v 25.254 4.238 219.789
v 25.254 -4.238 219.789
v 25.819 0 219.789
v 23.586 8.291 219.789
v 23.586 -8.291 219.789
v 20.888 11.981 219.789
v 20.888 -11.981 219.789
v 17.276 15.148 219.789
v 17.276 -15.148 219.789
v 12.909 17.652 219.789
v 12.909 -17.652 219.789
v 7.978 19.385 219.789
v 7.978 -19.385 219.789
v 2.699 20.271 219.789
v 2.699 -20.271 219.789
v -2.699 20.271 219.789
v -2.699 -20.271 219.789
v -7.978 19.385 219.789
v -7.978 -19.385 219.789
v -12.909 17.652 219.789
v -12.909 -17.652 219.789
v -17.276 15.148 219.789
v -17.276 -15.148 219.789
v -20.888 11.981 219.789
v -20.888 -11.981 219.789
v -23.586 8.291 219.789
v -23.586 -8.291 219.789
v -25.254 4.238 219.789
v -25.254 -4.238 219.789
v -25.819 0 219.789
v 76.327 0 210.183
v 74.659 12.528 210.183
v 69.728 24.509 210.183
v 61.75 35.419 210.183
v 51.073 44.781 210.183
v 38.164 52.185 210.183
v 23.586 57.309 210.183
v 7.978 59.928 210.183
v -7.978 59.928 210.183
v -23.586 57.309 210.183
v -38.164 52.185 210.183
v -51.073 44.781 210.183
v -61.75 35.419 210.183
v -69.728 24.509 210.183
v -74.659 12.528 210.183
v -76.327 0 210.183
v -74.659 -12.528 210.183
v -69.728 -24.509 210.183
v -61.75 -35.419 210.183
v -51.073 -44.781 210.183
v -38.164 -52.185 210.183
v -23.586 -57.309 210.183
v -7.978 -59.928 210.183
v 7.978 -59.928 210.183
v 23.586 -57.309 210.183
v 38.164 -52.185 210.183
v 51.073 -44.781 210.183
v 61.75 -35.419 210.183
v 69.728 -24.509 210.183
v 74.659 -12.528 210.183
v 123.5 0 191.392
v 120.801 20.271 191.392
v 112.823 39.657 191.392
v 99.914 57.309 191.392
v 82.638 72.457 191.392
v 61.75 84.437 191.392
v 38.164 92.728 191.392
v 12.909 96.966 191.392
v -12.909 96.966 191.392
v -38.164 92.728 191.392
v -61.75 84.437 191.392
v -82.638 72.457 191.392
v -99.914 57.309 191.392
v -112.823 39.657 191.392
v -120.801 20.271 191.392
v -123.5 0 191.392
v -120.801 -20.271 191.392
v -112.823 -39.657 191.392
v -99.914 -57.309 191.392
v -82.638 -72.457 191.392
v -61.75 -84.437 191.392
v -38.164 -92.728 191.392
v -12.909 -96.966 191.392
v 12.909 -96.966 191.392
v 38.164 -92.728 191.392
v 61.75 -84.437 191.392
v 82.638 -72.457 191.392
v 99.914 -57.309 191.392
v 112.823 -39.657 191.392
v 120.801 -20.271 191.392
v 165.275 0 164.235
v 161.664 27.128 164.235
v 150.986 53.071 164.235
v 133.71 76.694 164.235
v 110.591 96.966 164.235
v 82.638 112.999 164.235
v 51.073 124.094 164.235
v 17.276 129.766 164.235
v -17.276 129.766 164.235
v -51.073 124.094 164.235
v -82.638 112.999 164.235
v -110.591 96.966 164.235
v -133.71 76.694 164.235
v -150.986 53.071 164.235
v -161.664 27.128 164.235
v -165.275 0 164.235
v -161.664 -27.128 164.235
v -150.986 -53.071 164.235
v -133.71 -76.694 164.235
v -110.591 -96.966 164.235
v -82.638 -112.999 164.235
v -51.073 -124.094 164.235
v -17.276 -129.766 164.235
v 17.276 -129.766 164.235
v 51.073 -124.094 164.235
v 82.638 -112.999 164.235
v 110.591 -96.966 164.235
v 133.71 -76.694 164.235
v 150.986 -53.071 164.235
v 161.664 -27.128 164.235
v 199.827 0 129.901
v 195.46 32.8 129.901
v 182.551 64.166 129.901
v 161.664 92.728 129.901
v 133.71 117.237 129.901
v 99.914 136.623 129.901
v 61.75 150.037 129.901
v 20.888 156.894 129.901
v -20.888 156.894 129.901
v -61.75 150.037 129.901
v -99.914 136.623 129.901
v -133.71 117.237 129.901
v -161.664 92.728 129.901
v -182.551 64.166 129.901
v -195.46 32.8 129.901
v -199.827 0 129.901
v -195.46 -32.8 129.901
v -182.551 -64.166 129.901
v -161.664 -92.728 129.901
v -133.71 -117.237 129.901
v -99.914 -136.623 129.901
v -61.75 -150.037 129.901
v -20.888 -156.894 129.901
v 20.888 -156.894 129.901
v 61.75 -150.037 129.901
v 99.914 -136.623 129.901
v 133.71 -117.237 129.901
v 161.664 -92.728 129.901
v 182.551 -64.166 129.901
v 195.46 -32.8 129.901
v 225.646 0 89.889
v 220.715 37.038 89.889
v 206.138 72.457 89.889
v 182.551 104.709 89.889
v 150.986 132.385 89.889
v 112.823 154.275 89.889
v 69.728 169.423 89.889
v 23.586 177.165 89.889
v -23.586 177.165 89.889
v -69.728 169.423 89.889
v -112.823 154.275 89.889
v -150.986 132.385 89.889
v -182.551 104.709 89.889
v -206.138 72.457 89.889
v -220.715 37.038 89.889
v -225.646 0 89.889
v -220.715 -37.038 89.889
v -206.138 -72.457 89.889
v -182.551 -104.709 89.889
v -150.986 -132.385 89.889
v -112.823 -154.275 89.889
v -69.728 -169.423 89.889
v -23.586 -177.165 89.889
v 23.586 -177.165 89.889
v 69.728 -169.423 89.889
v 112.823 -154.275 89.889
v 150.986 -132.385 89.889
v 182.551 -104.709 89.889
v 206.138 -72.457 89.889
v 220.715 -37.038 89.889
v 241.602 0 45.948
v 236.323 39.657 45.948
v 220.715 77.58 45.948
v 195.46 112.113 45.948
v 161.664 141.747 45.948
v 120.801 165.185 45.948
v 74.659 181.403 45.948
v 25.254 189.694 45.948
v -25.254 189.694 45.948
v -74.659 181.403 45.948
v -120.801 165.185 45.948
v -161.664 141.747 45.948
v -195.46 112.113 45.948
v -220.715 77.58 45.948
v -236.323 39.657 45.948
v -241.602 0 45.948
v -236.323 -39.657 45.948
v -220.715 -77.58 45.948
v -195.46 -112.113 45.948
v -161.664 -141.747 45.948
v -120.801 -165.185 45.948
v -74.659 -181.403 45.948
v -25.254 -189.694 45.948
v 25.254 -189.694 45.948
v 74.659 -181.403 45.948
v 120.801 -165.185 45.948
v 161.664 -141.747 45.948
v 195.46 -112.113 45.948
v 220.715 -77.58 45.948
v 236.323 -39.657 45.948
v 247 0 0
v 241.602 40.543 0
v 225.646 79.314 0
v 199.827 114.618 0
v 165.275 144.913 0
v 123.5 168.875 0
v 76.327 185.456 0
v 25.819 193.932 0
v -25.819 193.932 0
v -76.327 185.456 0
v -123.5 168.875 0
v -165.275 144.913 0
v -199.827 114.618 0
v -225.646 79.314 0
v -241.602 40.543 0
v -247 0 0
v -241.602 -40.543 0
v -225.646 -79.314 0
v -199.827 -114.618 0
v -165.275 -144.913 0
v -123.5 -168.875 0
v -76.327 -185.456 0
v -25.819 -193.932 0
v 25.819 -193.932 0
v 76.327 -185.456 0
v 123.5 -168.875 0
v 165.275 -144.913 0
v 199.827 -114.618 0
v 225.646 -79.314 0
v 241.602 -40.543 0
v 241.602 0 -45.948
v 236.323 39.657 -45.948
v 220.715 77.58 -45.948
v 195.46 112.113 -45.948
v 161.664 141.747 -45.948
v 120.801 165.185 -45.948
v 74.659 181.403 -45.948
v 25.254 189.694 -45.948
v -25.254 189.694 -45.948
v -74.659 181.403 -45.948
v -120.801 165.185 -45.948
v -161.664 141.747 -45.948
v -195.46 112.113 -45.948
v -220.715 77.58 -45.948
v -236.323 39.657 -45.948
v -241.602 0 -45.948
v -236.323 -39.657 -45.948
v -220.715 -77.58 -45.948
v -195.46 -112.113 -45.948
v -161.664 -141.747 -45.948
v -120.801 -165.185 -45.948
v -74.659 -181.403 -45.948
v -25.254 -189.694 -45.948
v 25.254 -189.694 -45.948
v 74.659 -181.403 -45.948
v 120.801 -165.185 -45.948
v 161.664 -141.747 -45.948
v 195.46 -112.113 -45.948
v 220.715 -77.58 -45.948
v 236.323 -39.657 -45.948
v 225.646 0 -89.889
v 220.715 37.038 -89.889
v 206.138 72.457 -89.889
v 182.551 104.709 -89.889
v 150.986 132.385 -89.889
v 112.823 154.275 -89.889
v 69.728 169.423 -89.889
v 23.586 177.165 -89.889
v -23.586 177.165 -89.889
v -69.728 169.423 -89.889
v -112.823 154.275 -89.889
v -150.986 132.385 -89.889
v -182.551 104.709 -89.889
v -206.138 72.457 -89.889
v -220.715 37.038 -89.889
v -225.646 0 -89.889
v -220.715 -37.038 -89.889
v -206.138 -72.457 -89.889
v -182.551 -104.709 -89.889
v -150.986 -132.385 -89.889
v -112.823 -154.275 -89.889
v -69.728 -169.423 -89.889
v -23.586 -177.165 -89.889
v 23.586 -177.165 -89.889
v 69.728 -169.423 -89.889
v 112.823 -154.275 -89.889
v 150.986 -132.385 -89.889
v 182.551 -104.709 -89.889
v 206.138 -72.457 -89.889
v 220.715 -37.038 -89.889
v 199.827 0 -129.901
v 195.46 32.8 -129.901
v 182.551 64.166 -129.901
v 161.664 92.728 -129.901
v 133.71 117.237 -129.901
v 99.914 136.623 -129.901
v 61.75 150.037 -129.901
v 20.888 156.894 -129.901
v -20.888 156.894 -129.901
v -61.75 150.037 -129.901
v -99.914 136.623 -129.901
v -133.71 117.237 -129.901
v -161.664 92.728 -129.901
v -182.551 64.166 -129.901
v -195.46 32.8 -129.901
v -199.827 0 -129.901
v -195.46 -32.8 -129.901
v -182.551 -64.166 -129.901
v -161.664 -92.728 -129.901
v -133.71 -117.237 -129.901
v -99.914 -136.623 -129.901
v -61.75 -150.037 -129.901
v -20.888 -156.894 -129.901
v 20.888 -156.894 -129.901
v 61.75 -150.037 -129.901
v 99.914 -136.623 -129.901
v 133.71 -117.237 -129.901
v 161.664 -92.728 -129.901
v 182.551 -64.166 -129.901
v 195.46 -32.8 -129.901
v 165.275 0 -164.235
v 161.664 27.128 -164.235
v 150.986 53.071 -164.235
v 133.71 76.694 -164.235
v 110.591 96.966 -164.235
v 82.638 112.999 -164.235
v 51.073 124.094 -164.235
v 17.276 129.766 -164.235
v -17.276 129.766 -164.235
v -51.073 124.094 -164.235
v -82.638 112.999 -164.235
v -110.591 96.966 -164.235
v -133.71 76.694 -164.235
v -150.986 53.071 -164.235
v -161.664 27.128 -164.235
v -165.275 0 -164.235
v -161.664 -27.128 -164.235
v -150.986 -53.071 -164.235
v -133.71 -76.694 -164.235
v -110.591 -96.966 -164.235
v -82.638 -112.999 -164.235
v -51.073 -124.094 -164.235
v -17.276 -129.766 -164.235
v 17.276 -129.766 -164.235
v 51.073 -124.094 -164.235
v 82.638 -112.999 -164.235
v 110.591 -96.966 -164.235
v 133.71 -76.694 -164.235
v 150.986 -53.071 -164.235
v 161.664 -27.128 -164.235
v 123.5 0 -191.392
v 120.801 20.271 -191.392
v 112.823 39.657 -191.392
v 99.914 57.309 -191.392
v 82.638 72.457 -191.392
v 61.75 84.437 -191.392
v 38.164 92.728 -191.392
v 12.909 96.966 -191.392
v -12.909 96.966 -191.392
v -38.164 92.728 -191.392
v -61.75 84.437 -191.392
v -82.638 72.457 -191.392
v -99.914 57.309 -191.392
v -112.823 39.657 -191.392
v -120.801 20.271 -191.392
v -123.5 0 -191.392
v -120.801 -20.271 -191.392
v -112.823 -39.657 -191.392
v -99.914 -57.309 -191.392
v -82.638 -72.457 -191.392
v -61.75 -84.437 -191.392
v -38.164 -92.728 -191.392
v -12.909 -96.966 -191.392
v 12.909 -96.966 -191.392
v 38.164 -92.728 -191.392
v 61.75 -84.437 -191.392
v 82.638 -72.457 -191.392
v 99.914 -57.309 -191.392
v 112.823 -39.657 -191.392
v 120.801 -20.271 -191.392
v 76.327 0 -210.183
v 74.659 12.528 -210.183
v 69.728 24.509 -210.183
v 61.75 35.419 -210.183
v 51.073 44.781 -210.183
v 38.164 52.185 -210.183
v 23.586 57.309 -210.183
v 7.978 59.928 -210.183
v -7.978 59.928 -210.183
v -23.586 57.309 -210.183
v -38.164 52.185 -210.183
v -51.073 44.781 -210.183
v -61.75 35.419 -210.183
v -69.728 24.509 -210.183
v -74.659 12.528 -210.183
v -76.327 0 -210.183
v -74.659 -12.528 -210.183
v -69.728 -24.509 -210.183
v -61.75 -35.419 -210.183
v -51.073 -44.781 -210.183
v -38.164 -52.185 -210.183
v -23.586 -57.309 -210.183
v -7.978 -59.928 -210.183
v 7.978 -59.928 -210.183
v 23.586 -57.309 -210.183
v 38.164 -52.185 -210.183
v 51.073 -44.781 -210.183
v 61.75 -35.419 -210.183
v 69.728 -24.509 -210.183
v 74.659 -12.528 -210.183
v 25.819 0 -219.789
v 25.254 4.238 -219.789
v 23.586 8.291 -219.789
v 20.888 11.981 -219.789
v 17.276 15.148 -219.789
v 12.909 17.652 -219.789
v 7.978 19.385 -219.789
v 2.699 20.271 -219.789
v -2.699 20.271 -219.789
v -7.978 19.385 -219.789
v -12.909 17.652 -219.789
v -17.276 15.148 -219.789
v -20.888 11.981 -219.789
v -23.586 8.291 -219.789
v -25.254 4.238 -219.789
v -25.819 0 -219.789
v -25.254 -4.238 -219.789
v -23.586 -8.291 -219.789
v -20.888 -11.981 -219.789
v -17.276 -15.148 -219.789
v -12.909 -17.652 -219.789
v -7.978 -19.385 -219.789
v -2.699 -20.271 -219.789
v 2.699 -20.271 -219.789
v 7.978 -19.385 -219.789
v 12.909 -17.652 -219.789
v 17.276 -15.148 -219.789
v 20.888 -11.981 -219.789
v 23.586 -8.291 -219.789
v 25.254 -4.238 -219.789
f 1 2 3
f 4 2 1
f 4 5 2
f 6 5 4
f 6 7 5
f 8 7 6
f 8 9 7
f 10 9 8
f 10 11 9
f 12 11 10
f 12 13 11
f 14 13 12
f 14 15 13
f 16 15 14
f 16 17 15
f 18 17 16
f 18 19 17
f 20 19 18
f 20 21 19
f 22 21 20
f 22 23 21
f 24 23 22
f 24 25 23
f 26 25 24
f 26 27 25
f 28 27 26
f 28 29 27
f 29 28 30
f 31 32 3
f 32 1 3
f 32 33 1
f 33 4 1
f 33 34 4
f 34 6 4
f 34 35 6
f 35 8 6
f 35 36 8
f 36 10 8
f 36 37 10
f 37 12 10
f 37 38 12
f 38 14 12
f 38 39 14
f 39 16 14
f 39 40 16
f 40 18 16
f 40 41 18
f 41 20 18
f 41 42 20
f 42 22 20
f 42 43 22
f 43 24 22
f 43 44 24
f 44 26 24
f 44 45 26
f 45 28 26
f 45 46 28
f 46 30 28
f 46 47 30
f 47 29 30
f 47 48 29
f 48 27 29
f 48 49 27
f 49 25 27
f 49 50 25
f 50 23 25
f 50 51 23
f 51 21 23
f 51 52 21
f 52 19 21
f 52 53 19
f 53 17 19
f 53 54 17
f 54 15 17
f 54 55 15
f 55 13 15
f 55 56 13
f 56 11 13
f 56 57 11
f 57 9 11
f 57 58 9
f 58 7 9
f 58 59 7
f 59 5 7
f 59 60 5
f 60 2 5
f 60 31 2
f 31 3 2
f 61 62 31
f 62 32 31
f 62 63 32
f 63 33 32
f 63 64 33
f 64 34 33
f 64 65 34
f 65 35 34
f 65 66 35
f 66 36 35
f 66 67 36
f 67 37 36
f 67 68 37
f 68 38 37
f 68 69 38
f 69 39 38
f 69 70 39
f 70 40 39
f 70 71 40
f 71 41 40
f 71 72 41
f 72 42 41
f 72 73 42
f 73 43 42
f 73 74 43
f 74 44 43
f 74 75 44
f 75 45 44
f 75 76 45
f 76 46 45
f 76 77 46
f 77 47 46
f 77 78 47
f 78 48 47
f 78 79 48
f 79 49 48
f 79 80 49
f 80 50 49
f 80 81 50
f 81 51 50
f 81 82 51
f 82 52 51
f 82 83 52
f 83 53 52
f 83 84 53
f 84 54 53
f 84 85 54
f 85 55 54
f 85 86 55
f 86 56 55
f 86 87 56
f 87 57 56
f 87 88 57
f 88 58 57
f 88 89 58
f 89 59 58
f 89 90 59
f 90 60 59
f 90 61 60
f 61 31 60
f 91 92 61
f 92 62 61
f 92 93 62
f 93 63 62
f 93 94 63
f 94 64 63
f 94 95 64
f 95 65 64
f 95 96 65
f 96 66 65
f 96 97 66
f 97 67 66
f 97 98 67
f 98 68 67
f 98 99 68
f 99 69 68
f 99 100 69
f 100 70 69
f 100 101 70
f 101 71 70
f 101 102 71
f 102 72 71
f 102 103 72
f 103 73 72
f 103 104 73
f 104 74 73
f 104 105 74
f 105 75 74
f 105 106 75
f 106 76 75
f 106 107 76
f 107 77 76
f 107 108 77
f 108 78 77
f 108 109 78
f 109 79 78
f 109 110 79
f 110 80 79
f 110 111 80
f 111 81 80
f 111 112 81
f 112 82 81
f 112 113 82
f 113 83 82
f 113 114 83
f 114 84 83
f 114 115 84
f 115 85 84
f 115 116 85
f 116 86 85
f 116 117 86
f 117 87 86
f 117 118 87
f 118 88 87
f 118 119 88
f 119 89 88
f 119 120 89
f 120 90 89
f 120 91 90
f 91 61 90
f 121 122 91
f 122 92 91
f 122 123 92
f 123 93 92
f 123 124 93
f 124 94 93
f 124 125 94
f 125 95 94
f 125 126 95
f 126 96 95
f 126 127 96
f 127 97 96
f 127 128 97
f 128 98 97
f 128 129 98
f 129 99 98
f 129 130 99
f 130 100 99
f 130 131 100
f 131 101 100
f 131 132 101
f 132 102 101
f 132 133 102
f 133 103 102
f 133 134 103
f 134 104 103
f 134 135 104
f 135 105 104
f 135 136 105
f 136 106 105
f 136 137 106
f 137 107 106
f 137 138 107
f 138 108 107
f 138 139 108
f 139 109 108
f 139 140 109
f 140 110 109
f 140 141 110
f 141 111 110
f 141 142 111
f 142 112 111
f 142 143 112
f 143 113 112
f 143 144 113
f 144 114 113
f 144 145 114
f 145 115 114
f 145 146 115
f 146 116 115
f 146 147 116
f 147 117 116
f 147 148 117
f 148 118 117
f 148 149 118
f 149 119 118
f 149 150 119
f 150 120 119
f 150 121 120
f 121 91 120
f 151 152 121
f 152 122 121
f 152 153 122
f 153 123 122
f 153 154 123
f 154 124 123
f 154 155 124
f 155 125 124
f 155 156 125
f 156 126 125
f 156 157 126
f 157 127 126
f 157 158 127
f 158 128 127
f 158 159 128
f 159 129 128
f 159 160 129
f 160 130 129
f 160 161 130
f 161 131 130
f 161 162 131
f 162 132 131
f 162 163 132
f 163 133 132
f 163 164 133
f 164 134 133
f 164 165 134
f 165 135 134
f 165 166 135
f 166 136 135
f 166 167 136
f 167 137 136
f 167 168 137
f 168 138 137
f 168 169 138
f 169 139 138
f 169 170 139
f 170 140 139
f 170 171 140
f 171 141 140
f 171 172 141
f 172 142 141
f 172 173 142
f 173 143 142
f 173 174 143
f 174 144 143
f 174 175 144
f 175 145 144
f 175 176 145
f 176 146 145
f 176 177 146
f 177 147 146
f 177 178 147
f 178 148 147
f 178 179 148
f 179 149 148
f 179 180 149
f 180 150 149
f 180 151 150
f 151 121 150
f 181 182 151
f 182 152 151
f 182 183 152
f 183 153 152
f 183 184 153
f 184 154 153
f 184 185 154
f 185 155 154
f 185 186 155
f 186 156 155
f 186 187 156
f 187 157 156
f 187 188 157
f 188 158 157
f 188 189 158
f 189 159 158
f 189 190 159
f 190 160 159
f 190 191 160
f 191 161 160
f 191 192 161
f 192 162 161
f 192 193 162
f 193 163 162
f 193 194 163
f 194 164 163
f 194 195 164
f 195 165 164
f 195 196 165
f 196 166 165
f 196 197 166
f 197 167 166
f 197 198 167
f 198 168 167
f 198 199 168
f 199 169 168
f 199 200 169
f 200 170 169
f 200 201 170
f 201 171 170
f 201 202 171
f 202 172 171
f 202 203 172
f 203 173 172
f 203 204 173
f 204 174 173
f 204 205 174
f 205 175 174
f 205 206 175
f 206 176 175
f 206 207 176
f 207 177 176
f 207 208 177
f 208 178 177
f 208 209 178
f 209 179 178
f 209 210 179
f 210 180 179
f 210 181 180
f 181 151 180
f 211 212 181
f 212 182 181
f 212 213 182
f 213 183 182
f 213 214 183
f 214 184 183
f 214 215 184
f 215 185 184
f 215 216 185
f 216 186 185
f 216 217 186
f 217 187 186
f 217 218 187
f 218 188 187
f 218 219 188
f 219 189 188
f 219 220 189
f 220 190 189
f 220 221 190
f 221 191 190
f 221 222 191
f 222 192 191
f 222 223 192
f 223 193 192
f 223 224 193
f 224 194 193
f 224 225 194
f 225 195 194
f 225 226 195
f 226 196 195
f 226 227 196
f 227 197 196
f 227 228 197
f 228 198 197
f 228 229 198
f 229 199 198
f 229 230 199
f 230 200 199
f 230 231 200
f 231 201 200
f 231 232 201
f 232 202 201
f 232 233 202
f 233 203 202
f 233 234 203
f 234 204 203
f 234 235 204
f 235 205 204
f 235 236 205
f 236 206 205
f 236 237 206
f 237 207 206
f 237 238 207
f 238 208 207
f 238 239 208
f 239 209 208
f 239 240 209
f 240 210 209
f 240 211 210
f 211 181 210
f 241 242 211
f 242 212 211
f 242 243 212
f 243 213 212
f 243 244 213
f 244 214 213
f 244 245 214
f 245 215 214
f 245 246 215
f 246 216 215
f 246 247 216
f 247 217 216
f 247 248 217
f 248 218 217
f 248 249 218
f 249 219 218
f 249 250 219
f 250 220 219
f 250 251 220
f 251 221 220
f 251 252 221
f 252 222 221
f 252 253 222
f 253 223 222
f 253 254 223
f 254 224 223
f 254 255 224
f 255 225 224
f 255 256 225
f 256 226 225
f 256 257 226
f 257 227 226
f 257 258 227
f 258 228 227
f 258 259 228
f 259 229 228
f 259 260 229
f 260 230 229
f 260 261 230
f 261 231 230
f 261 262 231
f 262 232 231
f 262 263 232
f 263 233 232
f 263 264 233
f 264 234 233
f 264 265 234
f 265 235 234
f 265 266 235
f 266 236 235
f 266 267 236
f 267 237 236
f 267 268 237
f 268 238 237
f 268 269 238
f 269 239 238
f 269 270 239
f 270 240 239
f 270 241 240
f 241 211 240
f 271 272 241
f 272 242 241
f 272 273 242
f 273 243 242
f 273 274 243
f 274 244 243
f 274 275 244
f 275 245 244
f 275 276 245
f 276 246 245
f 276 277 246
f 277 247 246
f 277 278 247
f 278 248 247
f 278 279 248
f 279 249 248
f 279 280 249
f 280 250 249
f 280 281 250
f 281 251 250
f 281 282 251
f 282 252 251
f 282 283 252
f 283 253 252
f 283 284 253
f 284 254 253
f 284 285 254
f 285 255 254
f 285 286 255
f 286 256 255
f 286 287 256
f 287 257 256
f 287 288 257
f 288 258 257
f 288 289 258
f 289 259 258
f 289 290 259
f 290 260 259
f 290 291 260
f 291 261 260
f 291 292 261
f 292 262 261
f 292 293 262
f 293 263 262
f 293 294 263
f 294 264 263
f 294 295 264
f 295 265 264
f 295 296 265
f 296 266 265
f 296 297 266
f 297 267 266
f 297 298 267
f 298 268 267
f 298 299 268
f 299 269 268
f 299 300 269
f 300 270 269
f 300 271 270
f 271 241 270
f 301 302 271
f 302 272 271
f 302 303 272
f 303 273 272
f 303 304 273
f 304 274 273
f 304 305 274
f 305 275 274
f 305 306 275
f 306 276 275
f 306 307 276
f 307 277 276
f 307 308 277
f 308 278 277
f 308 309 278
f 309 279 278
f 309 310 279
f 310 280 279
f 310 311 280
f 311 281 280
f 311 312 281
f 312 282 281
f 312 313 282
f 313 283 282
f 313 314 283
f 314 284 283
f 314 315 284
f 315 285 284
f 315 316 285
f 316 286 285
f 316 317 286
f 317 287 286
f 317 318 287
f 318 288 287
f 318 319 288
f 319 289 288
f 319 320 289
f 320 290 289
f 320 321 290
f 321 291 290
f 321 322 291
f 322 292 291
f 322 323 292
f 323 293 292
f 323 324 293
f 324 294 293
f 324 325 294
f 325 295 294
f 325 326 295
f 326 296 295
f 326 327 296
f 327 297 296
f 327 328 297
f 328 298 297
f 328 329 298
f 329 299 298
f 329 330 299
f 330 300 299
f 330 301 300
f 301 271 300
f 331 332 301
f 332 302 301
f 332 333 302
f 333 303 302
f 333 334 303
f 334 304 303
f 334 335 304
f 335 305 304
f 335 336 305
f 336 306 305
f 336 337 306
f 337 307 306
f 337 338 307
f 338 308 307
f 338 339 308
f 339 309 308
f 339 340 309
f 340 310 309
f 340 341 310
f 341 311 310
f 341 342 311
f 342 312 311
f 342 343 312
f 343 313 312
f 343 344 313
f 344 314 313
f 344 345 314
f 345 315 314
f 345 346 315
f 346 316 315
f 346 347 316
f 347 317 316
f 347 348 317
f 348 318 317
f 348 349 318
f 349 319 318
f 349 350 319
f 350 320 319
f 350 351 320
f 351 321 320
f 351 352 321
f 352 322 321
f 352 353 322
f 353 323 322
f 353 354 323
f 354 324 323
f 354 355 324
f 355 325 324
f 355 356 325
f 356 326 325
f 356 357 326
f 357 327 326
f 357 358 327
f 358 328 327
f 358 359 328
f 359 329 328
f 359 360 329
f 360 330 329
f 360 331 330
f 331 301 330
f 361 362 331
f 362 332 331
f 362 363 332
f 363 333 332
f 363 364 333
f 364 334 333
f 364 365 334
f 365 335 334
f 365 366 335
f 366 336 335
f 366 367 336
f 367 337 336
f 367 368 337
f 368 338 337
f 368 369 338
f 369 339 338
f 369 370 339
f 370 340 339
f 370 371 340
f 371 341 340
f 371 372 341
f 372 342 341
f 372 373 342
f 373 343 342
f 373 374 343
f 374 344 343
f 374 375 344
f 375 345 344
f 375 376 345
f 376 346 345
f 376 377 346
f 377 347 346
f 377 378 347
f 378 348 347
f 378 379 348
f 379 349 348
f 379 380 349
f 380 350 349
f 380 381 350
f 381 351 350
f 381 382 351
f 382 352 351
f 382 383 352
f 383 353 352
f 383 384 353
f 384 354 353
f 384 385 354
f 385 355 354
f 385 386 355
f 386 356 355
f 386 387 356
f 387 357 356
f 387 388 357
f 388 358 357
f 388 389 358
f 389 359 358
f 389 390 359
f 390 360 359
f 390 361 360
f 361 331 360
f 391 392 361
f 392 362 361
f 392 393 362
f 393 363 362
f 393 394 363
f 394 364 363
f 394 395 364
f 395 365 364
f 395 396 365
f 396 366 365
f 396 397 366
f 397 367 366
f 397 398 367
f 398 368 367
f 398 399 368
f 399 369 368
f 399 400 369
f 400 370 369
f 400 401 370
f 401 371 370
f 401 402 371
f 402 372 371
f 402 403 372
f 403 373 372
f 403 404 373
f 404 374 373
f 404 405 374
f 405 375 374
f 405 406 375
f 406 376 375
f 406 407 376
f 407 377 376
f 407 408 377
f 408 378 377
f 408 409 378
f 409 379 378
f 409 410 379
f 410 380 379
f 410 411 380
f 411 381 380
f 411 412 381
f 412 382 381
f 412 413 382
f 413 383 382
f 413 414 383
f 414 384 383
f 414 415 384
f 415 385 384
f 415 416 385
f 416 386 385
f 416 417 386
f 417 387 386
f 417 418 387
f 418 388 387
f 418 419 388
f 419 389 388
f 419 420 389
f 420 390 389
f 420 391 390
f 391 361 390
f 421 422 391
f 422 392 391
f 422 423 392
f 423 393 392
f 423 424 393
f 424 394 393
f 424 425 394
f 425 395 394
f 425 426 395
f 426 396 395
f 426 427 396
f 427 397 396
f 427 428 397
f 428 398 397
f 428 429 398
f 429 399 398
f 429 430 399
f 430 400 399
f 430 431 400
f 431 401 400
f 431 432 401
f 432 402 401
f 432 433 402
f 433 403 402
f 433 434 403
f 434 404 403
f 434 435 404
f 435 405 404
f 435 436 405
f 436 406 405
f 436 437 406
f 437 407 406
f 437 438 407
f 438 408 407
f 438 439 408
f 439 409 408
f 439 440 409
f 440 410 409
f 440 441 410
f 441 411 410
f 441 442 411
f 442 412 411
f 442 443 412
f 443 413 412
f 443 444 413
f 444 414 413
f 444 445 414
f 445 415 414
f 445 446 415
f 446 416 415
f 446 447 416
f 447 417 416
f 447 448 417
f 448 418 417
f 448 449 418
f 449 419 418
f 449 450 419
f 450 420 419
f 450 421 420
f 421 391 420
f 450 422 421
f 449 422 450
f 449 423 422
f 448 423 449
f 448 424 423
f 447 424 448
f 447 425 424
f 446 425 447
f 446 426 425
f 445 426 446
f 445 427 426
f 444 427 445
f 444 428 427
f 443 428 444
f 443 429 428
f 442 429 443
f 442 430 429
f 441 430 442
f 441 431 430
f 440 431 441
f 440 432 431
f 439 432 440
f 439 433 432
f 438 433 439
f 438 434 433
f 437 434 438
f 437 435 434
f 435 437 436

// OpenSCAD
// Generated by SolidPython 1.0.1 on 2020-07-29 00:46:54


scale(v = [19, 15, 17]) {
	sphere(r = 13);
}
/***********************************************
*********      SolidPython code:      **********
************************************************
 
# import packages: SolidPython
from solid import *
from solid.utils import *
from itertools import chain, combinations, permutations


class Resize:

    def __init__(self, scad_file):
        self.scad_file = scad_file
        #self.scad_file = import_scad(scad_file)
        # cone/cylinder param:
        self.r1 = 0
        self.r2 = 0
        self.h = 0
        # rectangular prism param:
        self.w = 0
        self.l = 0
        # ellipse param:
        self.r = 0

    # import OpenScad code (file name corresponds to shape)


    # classify shape + parameters
    def assign(self, param1, param2, param3):
        if self.scad_file == 'cone.scad':
            self.r1 = param1
            self.r2 = param2
            self.h = param3
        elif self.scad_file == 'cylinder.scad':
            self.r1 = param1
            self.r2 = param2
            self.h = param3
        elif self.scad_file == 'rectangularPrism.scad':
            self.h = param1
            self.l = param2
            self.w = param3
        else:
            self.r = param1
            self.h = param2

    # resize parameters
    def iterate(self):
        x = range(3, 20, 2)
        i = 1
        if self.scad_file == 'cone.scad':
            tempList = list(permutations(x, 2))
            for temp in tempList:
                param1 = temp[0]
                param2 = temp[1]
                filepath = 'produced_scad_files/' + 'cone' + str(param1) + '_' + str(param2) + '_' + '.scad'
                scad_render_to_file(cylinder(h=param1, r1=param2, r2=0), filepath)

        elif self.scad_file == 'cylinder.scad':
            tempList = list(permutations(x, 3))
            for temp in tempList:
                param1 = temp[0]
                param2 = temp[1]
                filepath = 'produced_scad_files/' + 'cylinder' + str(param1) + '_' + str(param2) + '_' + '.scad'
                scad_render_to_file(cylinder(h=param1, r1=param2, r2=param2), filepath)

        elif self.scad_file == 'rectangularPrism.scad':
            tempList = list(permutations(x, 3))
            for temp in tempList:
                param1 = temp[0]
                param2 = temp[1]
                param3 = temp[2]
                filepath = 'produced_scad_files/' + 'rectangularPrism' + str(param1) + '_' + str(param2) + '_' + str(
                    param3) + '.scad'
                scad_render_to_file(cube(size=(param1, param2, param3)), filepath)

        elif self.scad_file == 'ellipse.scad':
            tempList = list(permutations(x, 4))
            for temp in tempList:
                param1 = temp[0]
                param2 = temp[1]
                param3 = temp[2]
                param4 = temp[3]
                filepath = 'produced_scad_files/' + 'ellipse' + str(param1) + '_' + str(param2) + '_' + str(param3) + '_' + str(param4) + '.scad'
                scad_render_to_file(scale([param1, param2, param3])(sphere(r=param4)), filepath)

    def render_to_scadfile(self):
        scad_render_to_file(scad, 'example.scad') 
 
************************************************/
